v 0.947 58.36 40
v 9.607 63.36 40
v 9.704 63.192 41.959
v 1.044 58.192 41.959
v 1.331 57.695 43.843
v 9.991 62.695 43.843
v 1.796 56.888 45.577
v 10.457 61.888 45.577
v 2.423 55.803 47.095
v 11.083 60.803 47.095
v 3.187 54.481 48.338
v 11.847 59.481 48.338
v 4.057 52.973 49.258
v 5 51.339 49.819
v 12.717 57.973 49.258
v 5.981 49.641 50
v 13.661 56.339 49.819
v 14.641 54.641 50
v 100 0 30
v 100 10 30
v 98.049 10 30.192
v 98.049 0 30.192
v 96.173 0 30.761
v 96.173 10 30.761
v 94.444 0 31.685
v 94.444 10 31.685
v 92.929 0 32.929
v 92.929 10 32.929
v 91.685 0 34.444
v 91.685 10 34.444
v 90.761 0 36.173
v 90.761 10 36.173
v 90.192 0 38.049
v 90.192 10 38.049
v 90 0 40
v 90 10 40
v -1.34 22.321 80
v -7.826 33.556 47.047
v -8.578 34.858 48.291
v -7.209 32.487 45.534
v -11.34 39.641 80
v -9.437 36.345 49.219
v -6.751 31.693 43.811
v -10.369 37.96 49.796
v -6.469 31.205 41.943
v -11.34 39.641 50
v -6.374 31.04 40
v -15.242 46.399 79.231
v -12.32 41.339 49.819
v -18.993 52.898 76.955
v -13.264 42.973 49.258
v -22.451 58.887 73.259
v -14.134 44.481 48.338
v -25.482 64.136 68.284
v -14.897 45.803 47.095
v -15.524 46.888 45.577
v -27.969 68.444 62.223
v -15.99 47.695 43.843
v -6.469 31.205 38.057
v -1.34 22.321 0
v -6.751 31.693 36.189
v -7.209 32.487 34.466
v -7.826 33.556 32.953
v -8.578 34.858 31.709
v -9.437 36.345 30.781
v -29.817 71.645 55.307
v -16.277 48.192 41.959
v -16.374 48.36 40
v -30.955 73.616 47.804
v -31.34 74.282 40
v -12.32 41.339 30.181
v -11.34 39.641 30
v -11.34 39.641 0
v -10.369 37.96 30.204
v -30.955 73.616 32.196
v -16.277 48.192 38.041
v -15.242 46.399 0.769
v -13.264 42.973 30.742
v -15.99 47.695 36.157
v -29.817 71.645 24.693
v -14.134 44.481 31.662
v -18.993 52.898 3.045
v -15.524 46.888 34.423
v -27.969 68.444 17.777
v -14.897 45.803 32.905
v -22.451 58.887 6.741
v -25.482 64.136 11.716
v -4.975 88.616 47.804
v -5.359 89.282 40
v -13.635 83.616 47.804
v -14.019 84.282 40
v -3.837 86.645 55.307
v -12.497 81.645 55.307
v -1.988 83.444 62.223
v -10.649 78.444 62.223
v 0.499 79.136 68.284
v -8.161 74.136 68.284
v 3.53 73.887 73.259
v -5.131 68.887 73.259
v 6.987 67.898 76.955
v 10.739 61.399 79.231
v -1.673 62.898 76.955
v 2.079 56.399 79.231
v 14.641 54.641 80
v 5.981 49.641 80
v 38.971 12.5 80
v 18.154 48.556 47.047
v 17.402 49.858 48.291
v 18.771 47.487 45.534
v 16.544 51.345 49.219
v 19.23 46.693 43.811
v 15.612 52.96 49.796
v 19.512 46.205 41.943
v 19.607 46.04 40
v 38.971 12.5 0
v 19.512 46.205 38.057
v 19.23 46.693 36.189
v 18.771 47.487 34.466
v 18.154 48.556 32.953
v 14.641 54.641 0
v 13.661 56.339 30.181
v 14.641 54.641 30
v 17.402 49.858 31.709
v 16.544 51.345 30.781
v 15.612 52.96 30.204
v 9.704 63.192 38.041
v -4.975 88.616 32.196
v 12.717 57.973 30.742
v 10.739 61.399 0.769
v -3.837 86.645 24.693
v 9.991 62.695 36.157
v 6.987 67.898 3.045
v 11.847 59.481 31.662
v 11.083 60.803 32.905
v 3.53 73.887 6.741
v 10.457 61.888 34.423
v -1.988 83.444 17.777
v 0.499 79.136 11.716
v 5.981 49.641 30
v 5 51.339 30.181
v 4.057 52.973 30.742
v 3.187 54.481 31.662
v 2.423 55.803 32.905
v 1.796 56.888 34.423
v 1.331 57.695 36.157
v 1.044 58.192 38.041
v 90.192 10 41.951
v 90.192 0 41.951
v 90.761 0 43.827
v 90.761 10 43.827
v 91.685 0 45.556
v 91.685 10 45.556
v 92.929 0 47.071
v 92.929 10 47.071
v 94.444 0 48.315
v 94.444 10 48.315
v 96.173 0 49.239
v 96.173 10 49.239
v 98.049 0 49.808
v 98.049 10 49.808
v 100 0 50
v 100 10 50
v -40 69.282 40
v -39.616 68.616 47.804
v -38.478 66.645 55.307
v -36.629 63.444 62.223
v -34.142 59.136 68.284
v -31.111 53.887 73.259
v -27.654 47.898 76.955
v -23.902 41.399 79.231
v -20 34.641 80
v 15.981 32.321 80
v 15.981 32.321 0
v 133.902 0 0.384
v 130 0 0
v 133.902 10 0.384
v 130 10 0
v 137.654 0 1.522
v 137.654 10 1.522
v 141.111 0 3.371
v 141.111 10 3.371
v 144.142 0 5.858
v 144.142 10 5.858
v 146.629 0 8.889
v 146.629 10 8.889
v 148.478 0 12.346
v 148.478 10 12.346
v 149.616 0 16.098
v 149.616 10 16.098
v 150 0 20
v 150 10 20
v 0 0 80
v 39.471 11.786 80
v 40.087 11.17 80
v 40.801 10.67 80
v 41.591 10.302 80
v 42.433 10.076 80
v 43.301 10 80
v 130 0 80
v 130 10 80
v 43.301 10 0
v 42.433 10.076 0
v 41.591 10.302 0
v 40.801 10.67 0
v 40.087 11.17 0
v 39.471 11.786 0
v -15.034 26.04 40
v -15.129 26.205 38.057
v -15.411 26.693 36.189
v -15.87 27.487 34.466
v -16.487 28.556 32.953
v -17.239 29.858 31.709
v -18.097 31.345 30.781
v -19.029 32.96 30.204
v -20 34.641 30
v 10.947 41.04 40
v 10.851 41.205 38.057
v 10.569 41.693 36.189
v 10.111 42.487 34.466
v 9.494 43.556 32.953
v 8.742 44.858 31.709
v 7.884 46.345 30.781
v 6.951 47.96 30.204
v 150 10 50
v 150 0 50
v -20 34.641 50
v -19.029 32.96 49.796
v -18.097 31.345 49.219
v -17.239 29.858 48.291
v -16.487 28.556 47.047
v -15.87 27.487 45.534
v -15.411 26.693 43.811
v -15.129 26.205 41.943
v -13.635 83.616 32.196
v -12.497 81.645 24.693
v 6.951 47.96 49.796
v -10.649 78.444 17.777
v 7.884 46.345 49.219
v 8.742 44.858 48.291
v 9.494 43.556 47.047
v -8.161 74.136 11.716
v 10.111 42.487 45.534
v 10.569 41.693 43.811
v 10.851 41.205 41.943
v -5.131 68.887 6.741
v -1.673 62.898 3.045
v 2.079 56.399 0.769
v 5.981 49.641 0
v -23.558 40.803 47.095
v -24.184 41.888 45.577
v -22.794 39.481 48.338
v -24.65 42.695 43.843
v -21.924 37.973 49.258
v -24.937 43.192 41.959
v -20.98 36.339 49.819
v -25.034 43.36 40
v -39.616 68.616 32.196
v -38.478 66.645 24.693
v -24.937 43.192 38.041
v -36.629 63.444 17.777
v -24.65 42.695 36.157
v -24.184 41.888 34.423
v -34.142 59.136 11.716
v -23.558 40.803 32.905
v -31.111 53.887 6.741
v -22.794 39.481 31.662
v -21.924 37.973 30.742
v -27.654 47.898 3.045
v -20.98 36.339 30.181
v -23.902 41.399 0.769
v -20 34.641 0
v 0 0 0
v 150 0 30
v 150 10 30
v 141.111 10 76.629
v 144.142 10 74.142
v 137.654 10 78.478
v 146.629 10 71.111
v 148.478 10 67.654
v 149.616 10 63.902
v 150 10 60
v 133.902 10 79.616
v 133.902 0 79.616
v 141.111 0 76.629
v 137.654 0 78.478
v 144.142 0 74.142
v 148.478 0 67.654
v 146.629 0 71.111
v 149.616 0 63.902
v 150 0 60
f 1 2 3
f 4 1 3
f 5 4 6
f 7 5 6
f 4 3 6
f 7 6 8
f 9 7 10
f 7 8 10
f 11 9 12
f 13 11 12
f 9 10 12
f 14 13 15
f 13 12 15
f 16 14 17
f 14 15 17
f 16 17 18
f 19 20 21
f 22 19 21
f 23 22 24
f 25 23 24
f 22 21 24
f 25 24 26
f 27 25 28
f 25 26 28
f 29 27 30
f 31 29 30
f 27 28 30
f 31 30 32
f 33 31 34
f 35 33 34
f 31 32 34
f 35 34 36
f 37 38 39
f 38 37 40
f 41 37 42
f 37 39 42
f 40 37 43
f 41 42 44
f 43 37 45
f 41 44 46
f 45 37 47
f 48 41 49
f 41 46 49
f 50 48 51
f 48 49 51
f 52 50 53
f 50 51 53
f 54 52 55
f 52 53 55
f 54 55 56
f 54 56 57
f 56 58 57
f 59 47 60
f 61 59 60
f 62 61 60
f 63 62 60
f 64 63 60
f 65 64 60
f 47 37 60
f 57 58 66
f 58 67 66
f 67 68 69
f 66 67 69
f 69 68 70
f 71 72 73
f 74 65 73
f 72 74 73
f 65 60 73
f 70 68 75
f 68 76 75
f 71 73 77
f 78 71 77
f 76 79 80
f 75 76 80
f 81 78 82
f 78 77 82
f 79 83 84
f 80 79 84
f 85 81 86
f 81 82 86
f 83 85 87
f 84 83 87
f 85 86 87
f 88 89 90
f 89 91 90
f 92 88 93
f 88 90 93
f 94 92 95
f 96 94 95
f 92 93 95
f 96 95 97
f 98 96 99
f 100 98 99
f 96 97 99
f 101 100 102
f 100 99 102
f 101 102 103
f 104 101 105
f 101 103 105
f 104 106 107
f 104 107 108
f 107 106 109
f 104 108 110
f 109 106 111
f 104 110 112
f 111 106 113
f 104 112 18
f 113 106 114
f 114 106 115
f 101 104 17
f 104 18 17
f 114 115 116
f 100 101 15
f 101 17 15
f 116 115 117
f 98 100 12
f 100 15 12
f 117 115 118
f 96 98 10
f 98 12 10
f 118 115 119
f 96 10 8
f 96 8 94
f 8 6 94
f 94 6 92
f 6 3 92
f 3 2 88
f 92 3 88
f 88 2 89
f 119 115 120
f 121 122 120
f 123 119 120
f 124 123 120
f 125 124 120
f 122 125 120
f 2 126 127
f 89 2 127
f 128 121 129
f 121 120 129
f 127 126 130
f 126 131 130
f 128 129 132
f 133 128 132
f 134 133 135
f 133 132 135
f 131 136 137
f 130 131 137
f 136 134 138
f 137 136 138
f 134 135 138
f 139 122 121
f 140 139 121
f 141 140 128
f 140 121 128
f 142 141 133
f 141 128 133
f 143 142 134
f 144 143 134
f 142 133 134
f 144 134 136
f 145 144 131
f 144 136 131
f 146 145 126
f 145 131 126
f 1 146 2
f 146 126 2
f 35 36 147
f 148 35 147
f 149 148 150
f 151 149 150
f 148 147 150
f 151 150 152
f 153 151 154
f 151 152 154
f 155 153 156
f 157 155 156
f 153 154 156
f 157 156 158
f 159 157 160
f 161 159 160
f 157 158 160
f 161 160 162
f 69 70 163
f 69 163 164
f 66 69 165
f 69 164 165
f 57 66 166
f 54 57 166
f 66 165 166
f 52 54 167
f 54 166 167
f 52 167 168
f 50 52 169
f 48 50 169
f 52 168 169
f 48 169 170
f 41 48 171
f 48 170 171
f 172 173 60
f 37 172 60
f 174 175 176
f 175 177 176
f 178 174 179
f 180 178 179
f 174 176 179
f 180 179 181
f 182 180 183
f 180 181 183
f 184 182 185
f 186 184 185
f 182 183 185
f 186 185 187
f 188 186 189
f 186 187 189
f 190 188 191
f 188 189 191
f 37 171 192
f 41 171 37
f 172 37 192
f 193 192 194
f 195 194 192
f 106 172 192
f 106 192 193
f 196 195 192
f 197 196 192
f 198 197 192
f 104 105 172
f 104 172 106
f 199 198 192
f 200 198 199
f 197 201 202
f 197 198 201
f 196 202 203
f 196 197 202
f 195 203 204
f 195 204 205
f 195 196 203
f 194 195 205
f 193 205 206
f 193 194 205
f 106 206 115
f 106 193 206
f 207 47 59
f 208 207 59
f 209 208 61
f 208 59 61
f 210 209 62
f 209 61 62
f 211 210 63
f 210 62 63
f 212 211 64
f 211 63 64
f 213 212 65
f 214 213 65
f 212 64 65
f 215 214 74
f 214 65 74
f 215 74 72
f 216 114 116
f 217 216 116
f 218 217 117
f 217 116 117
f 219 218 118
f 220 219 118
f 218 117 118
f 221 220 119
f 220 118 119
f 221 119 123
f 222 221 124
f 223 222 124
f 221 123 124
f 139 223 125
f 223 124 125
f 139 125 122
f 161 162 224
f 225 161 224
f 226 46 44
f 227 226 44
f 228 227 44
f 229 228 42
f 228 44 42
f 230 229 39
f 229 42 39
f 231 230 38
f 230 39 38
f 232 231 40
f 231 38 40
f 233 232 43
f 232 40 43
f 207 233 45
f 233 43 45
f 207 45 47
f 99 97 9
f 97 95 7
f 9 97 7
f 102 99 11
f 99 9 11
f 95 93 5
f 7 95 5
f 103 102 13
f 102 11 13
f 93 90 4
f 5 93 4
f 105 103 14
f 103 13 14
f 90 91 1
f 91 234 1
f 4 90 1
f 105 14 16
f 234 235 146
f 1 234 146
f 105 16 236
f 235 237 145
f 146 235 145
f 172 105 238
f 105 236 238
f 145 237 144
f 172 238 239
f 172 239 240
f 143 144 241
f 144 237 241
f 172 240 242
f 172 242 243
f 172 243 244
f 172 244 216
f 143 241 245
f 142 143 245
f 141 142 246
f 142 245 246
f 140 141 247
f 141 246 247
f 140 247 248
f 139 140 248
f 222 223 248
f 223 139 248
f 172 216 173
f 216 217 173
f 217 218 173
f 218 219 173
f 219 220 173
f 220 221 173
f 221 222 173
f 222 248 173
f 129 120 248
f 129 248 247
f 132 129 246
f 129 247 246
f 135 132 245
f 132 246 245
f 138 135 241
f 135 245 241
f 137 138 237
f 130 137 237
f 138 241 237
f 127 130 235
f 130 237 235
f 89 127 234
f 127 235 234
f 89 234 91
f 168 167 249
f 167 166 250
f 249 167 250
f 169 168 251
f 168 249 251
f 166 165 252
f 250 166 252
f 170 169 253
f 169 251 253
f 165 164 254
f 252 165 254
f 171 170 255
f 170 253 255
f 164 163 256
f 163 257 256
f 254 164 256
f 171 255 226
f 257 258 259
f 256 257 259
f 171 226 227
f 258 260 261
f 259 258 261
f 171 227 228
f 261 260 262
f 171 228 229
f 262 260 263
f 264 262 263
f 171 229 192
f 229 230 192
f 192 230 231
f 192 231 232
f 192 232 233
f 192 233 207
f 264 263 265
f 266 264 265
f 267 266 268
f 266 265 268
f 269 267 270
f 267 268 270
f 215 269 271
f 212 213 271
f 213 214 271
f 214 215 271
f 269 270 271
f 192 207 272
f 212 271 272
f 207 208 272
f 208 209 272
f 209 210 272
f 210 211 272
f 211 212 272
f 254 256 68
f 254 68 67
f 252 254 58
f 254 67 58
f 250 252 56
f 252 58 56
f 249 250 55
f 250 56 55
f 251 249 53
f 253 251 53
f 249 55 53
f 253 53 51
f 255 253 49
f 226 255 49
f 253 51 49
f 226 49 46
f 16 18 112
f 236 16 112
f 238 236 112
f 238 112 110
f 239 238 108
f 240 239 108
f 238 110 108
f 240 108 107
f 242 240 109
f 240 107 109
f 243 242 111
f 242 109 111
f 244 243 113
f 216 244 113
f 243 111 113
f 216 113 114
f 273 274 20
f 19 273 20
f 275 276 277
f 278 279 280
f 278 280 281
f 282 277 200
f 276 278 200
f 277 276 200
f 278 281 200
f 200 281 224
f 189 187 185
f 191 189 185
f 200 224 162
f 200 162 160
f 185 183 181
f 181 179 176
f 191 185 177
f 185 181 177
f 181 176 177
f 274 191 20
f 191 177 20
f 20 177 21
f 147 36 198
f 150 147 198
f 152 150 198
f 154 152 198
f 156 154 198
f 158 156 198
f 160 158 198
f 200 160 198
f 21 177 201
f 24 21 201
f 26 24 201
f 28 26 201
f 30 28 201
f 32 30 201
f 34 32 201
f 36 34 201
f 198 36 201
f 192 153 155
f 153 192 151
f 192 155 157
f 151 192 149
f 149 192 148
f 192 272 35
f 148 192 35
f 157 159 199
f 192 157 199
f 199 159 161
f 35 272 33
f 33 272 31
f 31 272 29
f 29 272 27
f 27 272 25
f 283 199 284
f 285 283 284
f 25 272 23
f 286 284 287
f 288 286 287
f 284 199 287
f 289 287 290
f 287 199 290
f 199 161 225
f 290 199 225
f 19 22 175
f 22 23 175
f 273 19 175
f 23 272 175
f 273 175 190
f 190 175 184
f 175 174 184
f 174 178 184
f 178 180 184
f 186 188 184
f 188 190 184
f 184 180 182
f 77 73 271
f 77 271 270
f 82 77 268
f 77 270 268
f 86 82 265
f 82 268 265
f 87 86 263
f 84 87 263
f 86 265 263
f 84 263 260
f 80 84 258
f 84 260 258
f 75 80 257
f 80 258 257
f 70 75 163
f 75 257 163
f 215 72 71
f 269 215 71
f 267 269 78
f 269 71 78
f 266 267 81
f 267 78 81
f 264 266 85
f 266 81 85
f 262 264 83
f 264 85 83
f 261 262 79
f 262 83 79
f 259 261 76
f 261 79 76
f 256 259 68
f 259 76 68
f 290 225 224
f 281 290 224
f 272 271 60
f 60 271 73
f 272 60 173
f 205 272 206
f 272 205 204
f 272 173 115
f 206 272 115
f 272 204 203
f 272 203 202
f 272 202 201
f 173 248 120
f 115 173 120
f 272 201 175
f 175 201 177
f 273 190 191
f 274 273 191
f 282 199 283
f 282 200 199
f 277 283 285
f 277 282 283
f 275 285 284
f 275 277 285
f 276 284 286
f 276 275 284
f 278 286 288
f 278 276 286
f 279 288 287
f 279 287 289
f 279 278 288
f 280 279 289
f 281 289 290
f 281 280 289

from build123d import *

# Parameters (mm, degrees)
F1_DEPTH = 80
F3_DEPTH = 36
F4_R     = 20
F5_R     = 5
F6_R     = 39.99999
F8_DEPTH = 85


# Not quite as in the source:
# - a fillet or chamfer is up to 0.001 mm smaller than in the source, because OpenCascade refuses the exact size


with BuildPart() as f1:
    # F0 (on Top) → F1 (new body)
    with BuildSketch(Plane.XY):
        Polygon((-40, 69.2820323028), (0, 0), (150, 0), (150, 10), (40.4145188433, 10), (-5.3589838486, 89.2820323028), (-14.0192378865, 84.2820323028), (15.9807621135, 32.3205080757), (-1.3397459622, 22.3205080757), (-31.3397459622, 74.2820323028), align=None)
    extrude(amount=F1_DEPTH)

    # F2 (on face) → F3 (cut)
    with BuildSketch(Plane(origin=(0, 10, 0), x_dir=(-1, 0, 0), z_dir=(0, 1, 0))):
        with BuildLine():
            Line((-90, 40), (-150, 40))
            Line((-150, 40), (-150, 30))
            Line((-150, 30), (-100, 30))
            ThreePointArc((-100, 30), (-92.9289321881, 32.9289321881), (-90, 40))
        make_face()
        with BuildLine():
            Line((-150, 50), (-150, 40))
            Line((-150, 40), (-90, 40))
            ThreePointArc((-90, 40), (-92.9289321881, 47.0710678119), (-100, 50))
            Line((-100, 50), (-150, 50))
        make_face()
    extrude(amount=-F3_DEPTH, mode=Mode.SUBTRACT)

    # F4
    f4_edges = [f1.edges().sort_by_distance(p)[0] for p in [
        (150, 5, 80),
        (150, 5, 0),
    ]]
    fillet(f4_edges, radius=F4_R)

    # F5
    f5_edges = [f1.edges().sort_by_distance(p)[0] for p in [
        (40.414519, 10, 40),
    ]]
    fillet(f5_edges, radius=F5_R)

    # F6 (radius 40 in the source; OpenCascade refuses exactly that, so slightly less here)
    f6_edges = [f1.edges().sort_by_distance(p)[0] for p in [
        (-9.689111, 86.782032, 0),
        (-35.669873, 71.782032, 0),
        (-9.689111, 86.782032, 80),
        (-35.669873, 71.782032, 80),
    ]]
    fillet(f6_edges, radius=F6_R)

    # F7 (on face) → F8 (cut)
    with BuildSketch(Plane(origin=(34.6410161514, 20, 0), x_dir=(-0.5, 0.8660254038, 0), z_dir=(0.8660254038, 0.5, 0))):
        with BuildLine():
            ThreePointArc((50.0682017207, 40), (47.1151153286, 47.0951397875), (40, 49.9997674236))
            ThreePointArc((40, 49.9997674236), (32.9730619333, 47.0469136078), (30.0682017207, 40))
            ThreePointArc((30.0682017207, 40), (32.9730619333, 32.9530863922), (40, 30.0002325764))
            ThreePointArc((40, 30.0002325764), (47.1151153286, 32.9048602125), (50.0682017207, 40))
        make_face()
    extrude(amount=-F8_DEPTH, mode=Mode.SUBTRACT)


solid = f1.part
